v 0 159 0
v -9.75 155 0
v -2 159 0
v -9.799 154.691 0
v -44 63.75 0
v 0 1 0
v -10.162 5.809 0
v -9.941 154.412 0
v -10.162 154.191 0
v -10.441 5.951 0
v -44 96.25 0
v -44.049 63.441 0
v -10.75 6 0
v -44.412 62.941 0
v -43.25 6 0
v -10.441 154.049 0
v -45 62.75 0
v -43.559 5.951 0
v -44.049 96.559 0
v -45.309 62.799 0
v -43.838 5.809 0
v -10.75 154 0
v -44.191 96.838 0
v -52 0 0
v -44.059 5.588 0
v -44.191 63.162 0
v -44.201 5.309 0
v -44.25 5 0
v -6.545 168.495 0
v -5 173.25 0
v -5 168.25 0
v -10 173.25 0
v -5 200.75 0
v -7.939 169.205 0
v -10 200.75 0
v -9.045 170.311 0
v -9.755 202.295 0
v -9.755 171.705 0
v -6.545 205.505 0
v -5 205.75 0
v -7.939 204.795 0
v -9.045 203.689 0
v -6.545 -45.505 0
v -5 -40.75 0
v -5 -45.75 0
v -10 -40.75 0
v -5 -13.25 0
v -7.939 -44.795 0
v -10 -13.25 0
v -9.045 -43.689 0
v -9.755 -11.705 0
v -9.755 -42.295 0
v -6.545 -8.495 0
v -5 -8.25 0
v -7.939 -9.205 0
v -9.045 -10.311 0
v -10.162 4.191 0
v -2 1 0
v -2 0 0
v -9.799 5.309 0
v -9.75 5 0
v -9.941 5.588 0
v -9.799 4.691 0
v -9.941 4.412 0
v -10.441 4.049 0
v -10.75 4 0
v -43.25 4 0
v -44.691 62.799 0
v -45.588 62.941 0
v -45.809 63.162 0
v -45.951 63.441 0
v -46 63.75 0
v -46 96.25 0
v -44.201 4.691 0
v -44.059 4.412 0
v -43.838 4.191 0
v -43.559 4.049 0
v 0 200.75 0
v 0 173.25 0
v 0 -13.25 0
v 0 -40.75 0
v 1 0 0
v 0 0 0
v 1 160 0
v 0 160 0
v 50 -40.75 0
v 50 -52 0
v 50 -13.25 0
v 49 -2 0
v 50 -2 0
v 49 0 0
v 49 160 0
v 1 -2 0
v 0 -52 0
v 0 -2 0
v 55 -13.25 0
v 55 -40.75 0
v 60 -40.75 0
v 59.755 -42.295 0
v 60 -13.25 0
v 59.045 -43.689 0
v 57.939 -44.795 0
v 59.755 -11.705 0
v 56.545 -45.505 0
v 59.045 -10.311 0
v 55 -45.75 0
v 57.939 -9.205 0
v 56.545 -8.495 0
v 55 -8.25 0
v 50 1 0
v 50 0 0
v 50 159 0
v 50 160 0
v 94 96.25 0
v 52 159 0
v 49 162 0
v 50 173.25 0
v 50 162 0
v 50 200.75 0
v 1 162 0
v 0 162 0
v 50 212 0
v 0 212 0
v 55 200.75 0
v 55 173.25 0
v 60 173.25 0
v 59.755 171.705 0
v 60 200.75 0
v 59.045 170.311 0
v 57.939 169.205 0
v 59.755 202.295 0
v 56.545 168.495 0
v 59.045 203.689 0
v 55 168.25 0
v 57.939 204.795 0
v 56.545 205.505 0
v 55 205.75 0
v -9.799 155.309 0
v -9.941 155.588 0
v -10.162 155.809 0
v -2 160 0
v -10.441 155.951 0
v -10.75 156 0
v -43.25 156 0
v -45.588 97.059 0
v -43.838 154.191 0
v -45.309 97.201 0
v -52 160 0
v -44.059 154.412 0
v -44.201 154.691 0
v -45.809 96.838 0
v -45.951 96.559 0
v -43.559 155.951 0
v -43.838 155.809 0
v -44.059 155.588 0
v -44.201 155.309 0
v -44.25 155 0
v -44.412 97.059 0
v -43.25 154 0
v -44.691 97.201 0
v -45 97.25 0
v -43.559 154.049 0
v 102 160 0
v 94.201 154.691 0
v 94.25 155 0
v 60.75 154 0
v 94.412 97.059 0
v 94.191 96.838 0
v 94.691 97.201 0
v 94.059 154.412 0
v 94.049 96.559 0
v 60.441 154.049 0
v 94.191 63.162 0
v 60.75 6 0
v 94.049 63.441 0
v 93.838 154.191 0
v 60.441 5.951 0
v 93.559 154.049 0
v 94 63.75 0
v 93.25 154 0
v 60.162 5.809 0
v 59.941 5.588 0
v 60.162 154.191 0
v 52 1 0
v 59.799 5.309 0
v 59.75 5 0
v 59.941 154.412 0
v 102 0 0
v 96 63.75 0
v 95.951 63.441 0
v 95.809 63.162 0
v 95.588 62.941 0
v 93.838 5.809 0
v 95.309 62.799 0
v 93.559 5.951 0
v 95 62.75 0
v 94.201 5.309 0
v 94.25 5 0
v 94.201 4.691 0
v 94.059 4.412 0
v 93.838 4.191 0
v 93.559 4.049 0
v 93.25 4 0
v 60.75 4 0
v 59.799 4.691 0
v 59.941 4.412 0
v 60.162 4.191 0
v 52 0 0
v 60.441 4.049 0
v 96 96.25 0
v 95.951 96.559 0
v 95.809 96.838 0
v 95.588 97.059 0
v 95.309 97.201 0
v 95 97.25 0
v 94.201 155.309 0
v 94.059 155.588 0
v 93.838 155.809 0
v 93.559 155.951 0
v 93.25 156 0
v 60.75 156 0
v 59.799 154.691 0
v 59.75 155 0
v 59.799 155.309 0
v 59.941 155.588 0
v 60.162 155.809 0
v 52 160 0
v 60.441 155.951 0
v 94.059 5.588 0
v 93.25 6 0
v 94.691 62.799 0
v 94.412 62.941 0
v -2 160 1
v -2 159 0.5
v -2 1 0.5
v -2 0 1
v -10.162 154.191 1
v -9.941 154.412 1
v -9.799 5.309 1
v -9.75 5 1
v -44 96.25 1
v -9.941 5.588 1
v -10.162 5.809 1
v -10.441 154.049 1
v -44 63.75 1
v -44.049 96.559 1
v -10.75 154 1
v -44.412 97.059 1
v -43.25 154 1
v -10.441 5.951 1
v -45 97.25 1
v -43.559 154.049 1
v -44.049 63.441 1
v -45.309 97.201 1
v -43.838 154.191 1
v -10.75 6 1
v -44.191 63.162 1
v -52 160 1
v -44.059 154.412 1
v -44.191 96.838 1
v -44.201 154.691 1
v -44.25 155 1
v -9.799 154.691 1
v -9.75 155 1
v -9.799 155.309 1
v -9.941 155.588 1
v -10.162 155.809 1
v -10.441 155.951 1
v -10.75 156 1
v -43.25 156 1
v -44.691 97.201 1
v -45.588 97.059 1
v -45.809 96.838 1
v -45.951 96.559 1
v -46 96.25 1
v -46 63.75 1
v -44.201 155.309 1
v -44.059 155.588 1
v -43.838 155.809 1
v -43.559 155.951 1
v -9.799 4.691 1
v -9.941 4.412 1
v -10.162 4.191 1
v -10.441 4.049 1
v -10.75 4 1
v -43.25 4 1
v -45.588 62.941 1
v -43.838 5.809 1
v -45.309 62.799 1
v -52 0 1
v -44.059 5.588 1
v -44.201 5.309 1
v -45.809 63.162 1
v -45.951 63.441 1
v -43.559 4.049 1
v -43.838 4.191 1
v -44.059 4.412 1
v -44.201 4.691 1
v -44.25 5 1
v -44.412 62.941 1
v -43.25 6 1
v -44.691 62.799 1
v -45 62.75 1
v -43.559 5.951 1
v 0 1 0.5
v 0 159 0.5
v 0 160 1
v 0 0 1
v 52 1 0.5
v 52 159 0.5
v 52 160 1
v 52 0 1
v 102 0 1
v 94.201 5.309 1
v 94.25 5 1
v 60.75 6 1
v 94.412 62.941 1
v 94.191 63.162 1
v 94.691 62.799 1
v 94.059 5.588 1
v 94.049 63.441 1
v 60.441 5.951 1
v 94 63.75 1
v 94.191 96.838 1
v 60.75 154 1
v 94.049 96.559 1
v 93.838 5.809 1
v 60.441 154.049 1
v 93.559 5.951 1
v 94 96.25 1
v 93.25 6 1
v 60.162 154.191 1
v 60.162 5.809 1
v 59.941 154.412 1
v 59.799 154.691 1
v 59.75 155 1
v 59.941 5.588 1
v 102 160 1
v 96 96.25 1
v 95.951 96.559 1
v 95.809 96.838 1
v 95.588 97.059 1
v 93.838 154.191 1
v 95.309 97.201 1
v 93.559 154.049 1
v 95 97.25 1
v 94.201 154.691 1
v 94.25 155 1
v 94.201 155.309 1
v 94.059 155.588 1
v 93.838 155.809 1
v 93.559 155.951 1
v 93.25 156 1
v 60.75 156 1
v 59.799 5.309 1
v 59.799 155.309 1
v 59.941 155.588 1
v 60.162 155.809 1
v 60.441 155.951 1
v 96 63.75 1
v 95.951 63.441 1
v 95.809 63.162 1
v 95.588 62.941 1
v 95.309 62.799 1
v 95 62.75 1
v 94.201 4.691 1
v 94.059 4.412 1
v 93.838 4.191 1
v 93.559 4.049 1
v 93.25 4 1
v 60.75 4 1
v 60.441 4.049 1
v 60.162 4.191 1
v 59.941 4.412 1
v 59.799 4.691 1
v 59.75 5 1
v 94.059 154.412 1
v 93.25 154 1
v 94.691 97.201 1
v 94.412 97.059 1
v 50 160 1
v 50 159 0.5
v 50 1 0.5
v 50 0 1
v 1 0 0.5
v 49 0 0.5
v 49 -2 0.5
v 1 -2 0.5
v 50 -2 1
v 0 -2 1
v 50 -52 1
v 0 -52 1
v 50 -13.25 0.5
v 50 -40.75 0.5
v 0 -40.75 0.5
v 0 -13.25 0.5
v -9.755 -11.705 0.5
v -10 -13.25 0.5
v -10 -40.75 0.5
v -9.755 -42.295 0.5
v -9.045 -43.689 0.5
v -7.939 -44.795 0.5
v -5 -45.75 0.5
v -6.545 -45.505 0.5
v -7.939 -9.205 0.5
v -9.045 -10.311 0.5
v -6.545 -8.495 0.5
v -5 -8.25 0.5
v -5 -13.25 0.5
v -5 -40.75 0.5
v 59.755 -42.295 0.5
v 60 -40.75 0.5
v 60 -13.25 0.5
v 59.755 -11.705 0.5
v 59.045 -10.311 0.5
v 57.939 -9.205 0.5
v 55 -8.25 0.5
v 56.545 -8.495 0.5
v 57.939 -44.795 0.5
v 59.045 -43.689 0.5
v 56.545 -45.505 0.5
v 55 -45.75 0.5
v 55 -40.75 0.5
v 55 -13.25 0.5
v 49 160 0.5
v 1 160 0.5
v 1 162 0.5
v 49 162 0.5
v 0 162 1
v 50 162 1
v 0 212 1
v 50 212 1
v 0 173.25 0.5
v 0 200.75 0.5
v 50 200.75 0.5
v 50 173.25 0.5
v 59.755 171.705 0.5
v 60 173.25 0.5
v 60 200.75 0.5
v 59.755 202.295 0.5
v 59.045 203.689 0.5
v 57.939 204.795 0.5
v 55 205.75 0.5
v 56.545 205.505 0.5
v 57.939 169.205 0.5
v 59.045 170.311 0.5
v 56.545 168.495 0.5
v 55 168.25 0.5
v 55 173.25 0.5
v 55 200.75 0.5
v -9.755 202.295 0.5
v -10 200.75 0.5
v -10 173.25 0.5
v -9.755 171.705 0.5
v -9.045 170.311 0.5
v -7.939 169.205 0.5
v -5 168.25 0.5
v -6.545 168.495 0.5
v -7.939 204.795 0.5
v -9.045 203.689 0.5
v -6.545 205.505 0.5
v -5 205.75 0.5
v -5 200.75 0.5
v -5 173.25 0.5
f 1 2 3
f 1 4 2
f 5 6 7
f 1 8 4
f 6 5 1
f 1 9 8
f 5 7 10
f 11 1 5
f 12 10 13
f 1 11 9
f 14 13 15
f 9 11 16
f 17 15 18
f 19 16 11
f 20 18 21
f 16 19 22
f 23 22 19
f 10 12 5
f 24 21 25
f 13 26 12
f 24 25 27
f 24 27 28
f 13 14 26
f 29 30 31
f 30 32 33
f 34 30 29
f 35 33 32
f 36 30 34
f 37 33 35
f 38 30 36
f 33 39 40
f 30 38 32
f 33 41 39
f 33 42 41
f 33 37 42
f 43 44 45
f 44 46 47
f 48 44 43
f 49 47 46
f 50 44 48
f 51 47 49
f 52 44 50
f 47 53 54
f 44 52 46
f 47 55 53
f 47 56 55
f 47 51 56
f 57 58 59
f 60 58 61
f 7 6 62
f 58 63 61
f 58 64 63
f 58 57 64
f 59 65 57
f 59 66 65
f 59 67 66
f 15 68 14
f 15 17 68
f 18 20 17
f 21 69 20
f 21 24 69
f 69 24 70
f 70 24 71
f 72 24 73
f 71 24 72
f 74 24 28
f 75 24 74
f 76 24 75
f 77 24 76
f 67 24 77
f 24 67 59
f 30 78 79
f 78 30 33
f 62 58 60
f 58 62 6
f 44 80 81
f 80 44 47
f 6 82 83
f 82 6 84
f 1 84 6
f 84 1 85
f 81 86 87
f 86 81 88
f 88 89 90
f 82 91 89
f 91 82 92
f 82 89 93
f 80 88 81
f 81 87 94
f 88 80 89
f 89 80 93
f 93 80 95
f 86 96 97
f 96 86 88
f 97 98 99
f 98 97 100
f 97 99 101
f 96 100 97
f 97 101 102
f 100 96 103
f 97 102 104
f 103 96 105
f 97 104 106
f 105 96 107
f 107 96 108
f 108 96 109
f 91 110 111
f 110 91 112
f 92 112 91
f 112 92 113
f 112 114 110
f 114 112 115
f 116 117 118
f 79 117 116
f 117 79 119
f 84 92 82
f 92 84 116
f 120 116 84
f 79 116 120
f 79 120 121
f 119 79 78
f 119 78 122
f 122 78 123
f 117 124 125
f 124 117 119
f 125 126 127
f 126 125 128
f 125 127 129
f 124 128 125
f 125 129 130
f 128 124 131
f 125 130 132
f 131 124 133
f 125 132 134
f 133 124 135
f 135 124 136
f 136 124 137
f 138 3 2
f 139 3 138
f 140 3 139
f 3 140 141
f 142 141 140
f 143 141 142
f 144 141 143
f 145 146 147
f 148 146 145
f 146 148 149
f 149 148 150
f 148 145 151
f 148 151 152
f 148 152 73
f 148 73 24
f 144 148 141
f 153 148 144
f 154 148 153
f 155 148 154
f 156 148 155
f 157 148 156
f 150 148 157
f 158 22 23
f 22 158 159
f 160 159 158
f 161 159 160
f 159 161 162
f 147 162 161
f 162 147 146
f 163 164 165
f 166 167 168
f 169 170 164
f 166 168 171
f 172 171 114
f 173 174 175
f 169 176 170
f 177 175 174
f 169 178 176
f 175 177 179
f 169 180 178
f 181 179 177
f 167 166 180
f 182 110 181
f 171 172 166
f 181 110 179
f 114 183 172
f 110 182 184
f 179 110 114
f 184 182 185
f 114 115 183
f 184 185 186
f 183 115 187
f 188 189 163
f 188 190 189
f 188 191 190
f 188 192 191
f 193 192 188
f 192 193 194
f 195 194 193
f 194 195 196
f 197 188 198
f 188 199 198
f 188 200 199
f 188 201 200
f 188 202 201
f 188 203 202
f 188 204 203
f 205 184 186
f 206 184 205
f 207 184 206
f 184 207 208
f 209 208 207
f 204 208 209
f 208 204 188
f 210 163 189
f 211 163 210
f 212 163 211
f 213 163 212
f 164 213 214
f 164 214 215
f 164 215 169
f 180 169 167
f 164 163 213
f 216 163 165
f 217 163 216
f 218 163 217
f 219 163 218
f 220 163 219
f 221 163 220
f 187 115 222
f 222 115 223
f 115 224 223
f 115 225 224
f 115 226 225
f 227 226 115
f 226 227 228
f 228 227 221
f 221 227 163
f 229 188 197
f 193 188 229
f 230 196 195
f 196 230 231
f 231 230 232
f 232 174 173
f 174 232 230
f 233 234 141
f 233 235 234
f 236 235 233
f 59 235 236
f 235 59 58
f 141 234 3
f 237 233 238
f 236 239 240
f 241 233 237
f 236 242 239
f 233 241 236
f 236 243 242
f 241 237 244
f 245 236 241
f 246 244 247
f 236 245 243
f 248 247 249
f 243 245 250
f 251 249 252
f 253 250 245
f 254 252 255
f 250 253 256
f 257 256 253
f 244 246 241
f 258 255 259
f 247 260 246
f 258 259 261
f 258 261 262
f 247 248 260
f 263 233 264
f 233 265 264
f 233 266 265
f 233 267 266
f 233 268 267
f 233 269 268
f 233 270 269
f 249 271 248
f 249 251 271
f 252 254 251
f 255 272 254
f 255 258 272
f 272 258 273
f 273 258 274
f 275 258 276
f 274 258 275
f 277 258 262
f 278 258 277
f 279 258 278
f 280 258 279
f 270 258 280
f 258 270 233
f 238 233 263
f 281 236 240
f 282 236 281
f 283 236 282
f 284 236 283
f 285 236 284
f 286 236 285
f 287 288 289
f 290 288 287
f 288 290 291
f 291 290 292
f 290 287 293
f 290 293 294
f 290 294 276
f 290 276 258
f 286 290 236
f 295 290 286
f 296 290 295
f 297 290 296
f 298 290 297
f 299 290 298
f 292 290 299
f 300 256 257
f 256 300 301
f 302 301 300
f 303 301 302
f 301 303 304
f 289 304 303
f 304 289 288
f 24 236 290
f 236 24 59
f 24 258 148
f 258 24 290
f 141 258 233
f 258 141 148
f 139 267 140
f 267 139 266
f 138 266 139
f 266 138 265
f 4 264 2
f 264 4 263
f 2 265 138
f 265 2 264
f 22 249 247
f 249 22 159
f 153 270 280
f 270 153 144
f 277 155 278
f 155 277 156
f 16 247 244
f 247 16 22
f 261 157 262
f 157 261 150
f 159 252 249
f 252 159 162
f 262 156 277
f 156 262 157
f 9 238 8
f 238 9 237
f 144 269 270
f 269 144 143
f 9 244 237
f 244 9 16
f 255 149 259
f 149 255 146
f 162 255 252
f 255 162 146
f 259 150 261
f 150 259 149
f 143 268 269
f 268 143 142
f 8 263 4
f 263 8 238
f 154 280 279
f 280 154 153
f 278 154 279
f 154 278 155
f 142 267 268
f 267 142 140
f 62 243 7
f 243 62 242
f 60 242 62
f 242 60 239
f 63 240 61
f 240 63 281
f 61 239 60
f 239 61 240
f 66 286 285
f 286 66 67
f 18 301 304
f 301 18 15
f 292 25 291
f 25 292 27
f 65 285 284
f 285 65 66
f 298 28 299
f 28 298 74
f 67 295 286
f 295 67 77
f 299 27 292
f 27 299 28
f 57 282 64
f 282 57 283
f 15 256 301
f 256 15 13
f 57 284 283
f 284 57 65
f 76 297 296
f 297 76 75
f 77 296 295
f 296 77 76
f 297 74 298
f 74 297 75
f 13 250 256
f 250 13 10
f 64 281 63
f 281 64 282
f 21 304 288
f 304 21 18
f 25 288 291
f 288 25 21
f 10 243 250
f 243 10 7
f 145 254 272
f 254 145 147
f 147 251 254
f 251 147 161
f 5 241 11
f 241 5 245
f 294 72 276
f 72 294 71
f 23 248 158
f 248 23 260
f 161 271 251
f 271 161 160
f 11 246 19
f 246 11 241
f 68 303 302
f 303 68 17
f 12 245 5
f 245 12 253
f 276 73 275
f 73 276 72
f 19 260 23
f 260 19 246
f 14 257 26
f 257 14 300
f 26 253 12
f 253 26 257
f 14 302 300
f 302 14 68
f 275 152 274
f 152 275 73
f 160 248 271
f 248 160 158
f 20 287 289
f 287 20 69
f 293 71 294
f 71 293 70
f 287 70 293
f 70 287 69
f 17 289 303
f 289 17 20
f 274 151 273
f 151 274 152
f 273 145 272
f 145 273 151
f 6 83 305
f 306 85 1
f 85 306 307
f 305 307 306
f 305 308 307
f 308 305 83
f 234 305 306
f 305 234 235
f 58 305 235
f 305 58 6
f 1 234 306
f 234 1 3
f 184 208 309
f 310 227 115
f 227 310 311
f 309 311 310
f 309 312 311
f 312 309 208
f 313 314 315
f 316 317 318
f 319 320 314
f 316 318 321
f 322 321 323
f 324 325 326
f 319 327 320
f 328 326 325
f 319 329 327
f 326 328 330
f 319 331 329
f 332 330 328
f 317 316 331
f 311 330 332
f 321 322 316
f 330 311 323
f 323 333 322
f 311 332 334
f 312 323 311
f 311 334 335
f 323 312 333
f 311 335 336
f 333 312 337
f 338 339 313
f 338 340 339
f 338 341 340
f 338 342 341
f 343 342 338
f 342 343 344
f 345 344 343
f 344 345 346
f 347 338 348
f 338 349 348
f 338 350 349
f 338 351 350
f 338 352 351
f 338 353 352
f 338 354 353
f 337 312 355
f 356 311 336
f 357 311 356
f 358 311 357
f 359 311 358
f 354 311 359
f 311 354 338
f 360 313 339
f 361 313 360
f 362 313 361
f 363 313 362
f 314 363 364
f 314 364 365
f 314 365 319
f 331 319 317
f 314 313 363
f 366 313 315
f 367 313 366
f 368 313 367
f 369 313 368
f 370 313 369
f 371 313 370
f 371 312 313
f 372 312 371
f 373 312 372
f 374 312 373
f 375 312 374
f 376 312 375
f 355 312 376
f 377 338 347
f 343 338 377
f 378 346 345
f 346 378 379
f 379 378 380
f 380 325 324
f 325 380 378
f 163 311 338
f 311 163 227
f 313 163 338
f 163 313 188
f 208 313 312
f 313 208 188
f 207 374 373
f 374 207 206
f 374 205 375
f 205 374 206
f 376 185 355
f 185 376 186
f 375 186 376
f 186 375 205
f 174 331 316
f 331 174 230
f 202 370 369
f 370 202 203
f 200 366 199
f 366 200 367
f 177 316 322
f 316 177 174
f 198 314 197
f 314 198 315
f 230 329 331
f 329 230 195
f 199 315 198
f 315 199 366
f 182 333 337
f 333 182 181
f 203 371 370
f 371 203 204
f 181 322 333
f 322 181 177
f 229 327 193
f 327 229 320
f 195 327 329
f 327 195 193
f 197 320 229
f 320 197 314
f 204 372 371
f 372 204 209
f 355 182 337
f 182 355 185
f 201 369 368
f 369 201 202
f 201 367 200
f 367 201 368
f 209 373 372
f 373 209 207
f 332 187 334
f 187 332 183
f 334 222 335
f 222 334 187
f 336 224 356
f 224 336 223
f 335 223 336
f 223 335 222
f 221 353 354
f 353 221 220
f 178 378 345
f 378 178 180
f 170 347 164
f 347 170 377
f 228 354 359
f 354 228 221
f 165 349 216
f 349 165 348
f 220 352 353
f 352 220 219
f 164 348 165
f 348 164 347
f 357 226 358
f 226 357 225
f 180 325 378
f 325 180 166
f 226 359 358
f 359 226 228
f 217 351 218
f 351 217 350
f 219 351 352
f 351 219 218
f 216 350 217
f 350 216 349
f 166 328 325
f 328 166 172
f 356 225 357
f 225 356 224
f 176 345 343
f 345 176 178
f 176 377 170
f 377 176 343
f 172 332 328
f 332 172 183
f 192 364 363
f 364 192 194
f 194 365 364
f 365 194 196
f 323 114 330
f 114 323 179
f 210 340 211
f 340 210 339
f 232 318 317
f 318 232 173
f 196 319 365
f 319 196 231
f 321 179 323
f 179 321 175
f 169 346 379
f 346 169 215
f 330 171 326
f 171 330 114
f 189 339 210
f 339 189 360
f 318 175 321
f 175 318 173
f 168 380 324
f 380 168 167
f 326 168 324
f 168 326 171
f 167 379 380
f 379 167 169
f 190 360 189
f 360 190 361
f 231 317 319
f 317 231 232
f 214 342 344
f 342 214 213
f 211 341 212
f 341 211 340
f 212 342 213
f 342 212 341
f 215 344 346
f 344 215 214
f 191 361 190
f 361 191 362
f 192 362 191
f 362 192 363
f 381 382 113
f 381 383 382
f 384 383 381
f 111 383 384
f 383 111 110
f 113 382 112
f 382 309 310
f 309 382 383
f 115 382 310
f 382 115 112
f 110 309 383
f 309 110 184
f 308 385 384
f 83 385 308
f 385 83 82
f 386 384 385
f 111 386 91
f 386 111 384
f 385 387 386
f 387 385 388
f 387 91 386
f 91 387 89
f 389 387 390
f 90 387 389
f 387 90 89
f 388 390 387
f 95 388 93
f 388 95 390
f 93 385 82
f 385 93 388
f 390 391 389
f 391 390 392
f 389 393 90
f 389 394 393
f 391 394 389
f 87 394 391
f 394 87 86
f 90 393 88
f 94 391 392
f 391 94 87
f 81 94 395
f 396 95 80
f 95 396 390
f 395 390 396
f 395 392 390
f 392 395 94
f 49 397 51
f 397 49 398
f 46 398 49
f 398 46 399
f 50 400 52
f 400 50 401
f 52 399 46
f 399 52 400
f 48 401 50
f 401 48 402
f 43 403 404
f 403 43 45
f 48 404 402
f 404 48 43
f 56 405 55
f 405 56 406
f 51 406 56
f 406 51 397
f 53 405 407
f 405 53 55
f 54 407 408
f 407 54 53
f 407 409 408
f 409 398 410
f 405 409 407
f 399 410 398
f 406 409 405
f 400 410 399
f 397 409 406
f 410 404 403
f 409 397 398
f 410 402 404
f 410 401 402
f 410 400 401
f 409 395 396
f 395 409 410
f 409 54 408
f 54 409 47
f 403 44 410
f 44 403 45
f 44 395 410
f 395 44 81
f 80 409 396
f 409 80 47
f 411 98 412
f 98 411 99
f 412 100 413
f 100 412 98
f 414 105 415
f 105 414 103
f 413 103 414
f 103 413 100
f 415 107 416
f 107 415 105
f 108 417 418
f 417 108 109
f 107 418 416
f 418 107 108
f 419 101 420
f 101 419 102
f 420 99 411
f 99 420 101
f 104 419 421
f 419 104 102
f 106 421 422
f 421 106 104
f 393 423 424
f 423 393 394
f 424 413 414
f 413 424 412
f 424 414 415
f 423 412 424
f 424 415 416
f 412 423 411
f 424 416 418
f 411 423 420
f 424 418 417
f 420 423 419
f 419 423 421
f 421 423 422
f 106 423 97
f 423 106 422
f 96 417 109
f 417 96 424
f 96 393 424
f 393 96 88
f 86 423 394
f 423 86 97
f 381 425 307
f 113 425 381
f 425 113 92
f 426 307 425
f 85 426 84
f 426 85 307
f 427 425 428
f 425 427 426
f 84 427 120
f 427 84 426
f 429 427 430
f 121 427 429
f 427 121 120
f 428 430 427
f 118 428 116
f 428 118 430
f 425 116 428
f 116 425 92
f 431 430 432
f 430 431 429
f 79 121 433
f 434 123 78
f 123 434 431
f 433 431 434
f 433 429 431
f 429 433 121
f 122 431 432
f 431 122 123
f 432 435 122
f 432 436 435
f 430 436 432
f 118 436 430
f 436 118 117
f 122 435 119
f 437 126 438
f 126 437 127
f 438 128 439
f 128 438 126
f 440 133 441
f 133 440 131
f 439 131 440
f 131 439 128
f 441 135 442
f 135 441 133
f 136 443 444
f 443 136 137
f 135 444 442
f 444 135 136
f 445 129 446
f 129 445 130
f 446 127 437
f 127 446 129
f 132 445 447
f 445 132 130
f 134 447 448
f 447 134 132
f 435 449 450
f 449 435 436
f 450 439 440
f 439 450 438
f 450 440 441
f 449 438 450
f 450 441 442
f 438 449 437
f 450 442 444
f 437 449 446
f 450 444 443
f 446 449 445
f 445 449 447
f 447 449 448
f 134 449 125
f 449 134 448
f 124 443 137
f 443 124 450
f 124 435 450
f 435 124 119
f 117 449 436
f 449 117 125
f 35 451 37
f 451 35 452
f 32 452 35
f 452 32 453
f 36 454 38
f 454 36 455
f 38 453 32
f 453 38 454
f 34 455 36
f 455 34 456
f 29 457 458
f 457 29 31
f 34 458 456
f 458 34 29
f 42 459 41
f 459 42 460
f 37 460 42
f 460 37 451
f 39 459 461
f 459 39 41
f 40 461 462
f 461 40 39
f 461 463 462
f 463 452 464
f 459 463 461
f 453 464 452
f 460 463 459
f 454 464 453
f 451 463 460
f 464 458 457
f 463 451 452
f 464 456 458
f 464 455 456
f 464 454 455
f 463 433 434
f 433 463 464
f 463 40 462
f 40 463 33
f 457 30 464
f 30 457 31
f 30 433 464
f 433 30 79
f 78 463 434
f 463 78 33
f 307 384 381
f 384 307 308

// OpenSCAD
// parameters
box_length = 160;
box_width = 50;
box_height = 50;

printInOne = true;

thickness = 1;
foilHinge_thickness = 0.5;
foilHinge_width = 2;
foilHinge_incision = 2;

anchor_radius = 5;
anchor_width = box_height*3/4;
anchor_baseWidth = anchor_width-2*anchor_radius;
anchor_baseLength = 5;

grommet_width = 1;
grommet_length = anchor_baseWidth+1*anchor_radius;

lid_grommet = true;

lengthCompensation = printInOne==true ? 0 : 2*anchor_baseLength;

length = box_length + lengthCompensation;
width = box_width;
height = box_height;

2d = false;

// main
if (2d){
    projection()
        basicBox_cutter();
} else {
    basicBox_cutter();
}


// modules
module basicBox_cutter(){
    if(printInOne){
            basicBox();
    } else {
        difference(){
            basicBox();
            translate([-(foilHinge_width+height),length,0])
                cube([width+2*height+2*foilHinge_width,height+foilHinge_width,10]);
            translate([-(foilHinge_width+height),length-2*anchor_baseLength,thickness/2])
                cube([width+2*height+2*foilHinge_width,height+foilHinge_width,10]);
        }
    }
}

module basicBox(){
    linear_extrude(thickness)
    square([width, length]); //base

    translate([0,length,0])
        rotate([0,0,180])
            xSide(); //left side
        
    translate([width,0,0])
            xSide(); //right side

    translate([width,0,0])
        rotate([0,0,180])
            ySide(); //lower side
       
    translate([0,length,0])
            ySide(); //upper side
}

module grommet(){
    linear_extrude(thickness)
        hull() {
            translate([-grommet_length/2,0,0]) 
                circle(grommet_width,$fn=20);
            translate([grommet_length/2,0,0]) 
                circle(grommet_width,$fn=20);
        }
}

module anchor(){
    translate([0,anchor_baseLength,0])
        difference(){
            linear_extrude(foilHinge_thickness)
                hull() {
                    translate([-(anchor_width/2-anchor_radius),0,0]) 
                        circle(anchor_radius,$fn=20);
                    translate([(anchor_width/2-anchor_radius),0,0]) 
                        circle(anchor_radius,$fn=20);
                }
            linear_extrude(foilHinge_thickness)
                translate([-anchor_width/2,-anchor_radius,0])
                    square([anchor_width,anchor_radius]);
                
        }
    translate([-anchor_baseWidth/2,0,0])
        linear_extrude(foilHinge_thickness)
            square([anchor_baseWidth,anchor_baseLength]);
}
    
module xSide(){
    linear_extrude(foilHinge_thickness)
        translate([0,foilHinge_incision/2,0])
            square([foilHinge_width, length-foilHinge_incision]);
    difference(){
        linear_extrude(thickness)
            translate([(foilHinge_width),0,0])
                square([height, length]);
        translate([height/2+foilHinge_width,anchor_baseLength,0])
            grommet();
        translate([height/2+foilHinge_width,length-anchor_baseLength,0])
            grommet();
        if(lid_grommet){
            translate([(height-anchor_baseLength),length/2,0])
                rotate([0,0,90])
                    grommet();
        }
    }
}

module ySide(){
    translate([width,0,0]){
        rotate([0,0,90]){
            linear_extrude(foilHinge_thickness)
                translate([0,foilHinge_incision/2,0])
                    square([foilHinge_width, width-foilHinge_incision]);
            linear_extrude(thickness)
                translate([(foilHinge_width),0,0])
                    square([height, width]);
        }
    }
    
    translate([width,height/2+foilHinge_width,0])
        rotate([0,0,270])
            anchor();
    translate([0,height/2+foilHinge_width,0])
        rotate([0,0,90])
            anchor();
}
